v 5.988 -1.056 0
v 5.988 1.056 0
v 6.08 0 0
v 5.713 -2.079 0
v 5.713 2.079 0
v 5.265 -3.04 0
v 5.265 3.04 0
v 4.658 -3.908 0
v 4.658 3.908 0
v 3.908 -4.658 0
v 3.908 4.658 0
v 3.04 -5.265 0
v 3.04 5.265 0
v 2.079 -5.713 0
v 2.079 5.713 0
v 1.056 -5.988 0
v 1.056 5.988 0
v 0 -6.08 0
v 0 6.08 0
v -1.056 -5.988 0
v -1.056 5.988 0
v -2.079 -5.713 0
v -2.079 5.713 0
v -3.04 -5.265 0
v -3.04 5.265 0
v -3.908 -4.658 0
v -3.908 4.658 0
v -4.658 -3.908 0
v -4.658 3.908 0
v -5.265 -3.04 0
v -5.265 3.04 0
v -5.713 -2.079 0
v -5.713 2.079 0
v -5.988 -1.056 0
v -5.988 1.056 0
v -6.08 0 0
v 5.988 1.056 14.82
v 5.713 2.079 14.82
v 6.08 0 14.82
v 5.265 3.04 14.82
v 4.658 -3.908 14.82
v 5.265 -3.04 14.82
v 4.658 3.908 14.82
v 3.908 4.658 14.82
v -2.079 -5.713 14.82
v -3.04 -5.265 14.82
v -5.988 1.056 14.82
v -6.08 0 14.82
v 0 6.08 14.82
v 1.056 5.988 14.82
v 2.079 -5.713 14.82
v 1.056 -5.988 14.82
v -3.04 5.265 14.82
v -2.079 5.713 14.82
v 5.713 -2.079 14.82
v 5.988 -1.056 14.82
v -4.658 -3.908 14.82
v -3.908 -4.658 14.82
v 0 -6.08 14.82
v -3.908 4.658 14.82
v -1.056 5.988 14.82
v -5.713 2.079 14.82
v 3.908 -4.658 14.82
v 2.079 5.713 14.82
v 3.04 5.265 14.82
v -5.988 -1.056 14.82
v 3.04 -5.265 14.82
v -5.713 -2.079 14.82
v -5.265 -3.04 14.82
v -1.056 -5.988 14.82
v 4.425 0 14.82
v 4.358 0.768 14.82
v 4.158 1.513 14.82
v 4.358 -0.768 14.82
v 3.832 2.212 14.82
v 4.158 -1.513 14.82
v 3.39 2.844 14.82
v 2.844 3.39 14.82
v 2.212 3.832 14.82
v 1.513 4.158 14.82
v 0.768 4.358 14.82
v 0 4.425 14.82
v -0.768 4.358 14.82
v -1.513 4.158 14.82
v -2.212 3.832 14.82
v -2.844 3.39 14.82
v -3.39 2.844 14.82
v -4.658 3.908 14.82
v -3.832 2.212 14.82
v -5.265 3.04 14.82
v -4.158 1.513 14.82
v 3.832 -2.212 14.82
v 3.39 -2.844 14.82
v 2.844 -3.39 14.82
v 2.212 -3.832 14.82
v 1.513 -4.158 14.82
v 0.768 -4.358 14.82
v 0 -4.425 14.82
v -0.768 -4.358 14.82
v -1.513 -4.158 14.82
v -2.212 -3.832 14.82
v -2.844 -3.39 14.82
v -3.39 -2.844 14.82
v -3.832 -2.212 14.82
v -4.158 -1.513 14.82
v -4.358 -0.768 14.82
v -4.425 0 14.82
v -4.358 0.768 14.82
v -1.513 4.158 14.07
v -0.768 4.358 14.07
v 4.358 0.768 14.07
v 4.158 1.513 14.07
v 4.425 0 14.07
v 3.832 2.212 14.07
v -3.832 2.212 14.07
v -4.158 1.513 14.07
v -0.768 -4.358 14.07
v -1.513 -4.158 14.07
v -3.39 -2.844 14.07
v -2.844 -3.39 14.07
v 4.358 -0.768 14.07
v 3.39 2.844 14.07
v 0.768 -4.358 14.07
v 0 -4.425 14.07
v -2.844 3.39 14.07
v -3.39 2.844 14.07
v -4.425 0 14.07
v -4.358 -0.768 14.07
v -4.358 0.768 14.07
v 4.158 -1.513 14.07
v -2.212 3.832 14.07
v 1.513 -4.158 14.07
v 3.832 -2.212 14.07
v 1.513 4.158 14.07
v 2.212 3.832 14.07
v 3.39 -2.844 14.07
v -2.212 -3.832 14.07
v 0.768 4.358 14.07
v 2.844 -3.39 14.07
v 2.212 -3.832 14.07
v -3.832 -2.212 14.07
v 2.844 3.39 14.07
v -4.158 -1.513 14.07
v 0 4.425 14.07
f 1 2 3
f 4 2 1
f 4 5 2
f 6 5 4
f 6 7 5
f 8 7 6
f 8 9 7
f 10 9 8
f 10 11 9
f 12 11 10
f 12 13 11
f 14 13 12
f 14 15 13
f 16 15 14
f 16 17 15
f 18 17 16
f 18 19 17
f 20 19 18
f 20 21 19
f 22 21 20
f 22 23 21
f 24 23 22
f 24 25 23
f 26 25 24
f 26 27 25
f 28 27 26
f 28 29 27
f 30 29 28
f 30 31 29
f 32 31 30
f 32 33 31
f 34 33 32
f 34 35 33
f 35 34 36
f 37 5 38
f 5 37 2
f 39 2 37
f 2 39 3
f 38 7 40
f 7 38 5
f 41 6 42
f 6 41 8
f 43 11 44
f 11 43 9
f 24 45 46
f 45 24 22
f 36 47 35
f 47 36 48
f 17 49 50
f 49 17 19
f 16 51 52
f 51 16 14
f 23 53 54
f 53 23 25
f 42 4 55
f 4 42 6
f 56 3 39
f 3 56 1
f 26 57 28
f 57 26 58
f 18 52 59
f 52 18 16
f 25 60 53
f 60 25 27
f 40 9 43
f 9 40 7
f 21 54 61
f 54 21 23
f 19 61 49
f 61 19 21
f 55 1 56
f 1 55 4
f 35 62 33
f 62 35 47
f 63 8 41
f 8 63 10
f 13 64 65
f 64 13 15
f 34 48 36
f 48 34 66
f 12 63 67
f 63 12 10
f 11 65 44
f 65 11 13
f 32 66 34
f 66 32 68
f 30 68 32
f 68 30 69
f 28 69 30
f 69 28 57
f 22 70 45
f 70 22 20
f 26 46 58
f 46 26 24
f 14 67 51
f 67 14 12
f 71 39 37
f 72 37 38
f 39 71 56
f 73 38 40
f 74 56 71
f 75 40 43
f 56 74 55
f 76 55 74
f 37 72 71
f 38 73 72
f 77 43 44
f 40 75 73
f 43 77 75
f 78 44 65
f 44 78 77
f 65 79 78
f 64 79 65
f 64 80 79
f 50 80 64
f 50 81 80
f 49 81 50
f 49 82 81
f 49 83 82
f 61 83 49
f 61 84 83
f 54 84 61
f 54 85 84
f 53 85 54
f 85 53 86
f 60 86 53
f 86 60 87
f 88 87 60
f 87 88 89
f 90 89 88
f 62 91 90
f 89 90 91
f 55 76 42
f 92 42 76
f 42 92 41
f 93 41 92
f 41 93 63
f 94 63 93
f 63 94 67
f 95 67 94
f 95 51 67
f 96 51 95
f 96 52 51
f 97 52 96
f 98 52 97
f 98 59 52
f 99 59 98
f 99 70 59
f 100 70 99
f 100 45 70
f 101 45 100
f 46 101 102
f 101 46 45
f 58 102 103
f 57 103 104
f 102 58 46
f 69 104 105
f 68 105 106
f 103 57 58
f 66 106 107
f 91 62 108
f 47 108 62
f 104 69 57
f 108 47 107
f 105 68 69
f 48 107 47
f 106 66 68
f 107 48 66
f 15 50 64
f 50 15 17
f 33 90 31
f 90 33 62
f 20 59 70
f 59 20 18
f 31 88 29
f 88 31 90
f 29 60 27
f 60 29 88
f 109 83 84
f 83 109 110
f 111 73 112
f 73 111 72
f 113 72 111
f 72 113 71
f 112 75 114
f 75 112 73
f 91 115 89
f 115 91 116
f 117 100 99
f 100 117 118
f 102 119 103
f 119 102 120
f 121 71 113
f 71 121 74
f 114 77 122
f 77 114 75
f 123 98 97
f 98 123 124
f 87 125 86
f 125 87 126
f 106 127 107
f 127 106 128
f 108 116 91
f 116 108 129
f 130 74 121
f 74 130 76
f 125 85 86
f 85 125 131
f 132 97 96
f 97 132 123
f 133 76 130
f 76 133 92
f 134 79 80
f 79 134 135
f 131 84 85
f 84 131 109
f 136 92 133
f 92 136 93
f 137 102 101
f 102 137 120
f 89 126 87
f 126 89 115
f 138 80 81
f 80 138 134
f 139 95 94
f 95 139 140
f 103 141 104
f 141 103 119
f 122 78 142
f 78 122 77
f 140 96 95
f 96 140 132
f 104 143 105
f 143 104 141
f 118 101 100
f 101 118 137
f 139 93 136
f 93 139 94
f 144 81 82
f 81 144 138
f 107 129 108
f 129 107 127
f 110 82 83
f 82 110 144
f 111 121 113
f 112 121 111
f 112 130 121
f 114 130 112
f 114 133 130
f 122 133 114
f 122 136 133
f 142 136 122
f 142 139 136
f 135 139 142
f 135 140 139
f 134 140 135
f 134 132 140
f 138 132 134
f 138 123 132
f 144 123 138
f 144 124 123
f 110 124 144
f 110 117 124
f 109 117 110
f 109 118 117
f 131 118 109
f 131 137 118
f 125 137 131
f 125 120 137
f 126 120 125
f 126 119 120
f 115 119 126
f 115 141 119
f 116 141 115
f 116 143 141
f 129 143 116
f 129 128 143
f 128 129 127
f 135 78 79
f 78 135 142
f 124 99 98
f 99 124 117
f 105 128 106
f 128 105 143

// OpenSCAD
tolerance = 0.2;
d=12.56;
h=12.63+5.03-1.5;
rubberStickyHeight = 2.09;
rubberInset = 0.75;
adjHeight = h - (rubberStickyHeight-rubberInset);

$fn = 36;

render(convexity=2)
difference() {
    cylinder(d=12.56-2*tolerance, h=adjHeight);
    translate([0,0,adjHeight-rubberInset])
    cylinder(d=8.45+2*tolerance, h=rubberInset+1);
}
